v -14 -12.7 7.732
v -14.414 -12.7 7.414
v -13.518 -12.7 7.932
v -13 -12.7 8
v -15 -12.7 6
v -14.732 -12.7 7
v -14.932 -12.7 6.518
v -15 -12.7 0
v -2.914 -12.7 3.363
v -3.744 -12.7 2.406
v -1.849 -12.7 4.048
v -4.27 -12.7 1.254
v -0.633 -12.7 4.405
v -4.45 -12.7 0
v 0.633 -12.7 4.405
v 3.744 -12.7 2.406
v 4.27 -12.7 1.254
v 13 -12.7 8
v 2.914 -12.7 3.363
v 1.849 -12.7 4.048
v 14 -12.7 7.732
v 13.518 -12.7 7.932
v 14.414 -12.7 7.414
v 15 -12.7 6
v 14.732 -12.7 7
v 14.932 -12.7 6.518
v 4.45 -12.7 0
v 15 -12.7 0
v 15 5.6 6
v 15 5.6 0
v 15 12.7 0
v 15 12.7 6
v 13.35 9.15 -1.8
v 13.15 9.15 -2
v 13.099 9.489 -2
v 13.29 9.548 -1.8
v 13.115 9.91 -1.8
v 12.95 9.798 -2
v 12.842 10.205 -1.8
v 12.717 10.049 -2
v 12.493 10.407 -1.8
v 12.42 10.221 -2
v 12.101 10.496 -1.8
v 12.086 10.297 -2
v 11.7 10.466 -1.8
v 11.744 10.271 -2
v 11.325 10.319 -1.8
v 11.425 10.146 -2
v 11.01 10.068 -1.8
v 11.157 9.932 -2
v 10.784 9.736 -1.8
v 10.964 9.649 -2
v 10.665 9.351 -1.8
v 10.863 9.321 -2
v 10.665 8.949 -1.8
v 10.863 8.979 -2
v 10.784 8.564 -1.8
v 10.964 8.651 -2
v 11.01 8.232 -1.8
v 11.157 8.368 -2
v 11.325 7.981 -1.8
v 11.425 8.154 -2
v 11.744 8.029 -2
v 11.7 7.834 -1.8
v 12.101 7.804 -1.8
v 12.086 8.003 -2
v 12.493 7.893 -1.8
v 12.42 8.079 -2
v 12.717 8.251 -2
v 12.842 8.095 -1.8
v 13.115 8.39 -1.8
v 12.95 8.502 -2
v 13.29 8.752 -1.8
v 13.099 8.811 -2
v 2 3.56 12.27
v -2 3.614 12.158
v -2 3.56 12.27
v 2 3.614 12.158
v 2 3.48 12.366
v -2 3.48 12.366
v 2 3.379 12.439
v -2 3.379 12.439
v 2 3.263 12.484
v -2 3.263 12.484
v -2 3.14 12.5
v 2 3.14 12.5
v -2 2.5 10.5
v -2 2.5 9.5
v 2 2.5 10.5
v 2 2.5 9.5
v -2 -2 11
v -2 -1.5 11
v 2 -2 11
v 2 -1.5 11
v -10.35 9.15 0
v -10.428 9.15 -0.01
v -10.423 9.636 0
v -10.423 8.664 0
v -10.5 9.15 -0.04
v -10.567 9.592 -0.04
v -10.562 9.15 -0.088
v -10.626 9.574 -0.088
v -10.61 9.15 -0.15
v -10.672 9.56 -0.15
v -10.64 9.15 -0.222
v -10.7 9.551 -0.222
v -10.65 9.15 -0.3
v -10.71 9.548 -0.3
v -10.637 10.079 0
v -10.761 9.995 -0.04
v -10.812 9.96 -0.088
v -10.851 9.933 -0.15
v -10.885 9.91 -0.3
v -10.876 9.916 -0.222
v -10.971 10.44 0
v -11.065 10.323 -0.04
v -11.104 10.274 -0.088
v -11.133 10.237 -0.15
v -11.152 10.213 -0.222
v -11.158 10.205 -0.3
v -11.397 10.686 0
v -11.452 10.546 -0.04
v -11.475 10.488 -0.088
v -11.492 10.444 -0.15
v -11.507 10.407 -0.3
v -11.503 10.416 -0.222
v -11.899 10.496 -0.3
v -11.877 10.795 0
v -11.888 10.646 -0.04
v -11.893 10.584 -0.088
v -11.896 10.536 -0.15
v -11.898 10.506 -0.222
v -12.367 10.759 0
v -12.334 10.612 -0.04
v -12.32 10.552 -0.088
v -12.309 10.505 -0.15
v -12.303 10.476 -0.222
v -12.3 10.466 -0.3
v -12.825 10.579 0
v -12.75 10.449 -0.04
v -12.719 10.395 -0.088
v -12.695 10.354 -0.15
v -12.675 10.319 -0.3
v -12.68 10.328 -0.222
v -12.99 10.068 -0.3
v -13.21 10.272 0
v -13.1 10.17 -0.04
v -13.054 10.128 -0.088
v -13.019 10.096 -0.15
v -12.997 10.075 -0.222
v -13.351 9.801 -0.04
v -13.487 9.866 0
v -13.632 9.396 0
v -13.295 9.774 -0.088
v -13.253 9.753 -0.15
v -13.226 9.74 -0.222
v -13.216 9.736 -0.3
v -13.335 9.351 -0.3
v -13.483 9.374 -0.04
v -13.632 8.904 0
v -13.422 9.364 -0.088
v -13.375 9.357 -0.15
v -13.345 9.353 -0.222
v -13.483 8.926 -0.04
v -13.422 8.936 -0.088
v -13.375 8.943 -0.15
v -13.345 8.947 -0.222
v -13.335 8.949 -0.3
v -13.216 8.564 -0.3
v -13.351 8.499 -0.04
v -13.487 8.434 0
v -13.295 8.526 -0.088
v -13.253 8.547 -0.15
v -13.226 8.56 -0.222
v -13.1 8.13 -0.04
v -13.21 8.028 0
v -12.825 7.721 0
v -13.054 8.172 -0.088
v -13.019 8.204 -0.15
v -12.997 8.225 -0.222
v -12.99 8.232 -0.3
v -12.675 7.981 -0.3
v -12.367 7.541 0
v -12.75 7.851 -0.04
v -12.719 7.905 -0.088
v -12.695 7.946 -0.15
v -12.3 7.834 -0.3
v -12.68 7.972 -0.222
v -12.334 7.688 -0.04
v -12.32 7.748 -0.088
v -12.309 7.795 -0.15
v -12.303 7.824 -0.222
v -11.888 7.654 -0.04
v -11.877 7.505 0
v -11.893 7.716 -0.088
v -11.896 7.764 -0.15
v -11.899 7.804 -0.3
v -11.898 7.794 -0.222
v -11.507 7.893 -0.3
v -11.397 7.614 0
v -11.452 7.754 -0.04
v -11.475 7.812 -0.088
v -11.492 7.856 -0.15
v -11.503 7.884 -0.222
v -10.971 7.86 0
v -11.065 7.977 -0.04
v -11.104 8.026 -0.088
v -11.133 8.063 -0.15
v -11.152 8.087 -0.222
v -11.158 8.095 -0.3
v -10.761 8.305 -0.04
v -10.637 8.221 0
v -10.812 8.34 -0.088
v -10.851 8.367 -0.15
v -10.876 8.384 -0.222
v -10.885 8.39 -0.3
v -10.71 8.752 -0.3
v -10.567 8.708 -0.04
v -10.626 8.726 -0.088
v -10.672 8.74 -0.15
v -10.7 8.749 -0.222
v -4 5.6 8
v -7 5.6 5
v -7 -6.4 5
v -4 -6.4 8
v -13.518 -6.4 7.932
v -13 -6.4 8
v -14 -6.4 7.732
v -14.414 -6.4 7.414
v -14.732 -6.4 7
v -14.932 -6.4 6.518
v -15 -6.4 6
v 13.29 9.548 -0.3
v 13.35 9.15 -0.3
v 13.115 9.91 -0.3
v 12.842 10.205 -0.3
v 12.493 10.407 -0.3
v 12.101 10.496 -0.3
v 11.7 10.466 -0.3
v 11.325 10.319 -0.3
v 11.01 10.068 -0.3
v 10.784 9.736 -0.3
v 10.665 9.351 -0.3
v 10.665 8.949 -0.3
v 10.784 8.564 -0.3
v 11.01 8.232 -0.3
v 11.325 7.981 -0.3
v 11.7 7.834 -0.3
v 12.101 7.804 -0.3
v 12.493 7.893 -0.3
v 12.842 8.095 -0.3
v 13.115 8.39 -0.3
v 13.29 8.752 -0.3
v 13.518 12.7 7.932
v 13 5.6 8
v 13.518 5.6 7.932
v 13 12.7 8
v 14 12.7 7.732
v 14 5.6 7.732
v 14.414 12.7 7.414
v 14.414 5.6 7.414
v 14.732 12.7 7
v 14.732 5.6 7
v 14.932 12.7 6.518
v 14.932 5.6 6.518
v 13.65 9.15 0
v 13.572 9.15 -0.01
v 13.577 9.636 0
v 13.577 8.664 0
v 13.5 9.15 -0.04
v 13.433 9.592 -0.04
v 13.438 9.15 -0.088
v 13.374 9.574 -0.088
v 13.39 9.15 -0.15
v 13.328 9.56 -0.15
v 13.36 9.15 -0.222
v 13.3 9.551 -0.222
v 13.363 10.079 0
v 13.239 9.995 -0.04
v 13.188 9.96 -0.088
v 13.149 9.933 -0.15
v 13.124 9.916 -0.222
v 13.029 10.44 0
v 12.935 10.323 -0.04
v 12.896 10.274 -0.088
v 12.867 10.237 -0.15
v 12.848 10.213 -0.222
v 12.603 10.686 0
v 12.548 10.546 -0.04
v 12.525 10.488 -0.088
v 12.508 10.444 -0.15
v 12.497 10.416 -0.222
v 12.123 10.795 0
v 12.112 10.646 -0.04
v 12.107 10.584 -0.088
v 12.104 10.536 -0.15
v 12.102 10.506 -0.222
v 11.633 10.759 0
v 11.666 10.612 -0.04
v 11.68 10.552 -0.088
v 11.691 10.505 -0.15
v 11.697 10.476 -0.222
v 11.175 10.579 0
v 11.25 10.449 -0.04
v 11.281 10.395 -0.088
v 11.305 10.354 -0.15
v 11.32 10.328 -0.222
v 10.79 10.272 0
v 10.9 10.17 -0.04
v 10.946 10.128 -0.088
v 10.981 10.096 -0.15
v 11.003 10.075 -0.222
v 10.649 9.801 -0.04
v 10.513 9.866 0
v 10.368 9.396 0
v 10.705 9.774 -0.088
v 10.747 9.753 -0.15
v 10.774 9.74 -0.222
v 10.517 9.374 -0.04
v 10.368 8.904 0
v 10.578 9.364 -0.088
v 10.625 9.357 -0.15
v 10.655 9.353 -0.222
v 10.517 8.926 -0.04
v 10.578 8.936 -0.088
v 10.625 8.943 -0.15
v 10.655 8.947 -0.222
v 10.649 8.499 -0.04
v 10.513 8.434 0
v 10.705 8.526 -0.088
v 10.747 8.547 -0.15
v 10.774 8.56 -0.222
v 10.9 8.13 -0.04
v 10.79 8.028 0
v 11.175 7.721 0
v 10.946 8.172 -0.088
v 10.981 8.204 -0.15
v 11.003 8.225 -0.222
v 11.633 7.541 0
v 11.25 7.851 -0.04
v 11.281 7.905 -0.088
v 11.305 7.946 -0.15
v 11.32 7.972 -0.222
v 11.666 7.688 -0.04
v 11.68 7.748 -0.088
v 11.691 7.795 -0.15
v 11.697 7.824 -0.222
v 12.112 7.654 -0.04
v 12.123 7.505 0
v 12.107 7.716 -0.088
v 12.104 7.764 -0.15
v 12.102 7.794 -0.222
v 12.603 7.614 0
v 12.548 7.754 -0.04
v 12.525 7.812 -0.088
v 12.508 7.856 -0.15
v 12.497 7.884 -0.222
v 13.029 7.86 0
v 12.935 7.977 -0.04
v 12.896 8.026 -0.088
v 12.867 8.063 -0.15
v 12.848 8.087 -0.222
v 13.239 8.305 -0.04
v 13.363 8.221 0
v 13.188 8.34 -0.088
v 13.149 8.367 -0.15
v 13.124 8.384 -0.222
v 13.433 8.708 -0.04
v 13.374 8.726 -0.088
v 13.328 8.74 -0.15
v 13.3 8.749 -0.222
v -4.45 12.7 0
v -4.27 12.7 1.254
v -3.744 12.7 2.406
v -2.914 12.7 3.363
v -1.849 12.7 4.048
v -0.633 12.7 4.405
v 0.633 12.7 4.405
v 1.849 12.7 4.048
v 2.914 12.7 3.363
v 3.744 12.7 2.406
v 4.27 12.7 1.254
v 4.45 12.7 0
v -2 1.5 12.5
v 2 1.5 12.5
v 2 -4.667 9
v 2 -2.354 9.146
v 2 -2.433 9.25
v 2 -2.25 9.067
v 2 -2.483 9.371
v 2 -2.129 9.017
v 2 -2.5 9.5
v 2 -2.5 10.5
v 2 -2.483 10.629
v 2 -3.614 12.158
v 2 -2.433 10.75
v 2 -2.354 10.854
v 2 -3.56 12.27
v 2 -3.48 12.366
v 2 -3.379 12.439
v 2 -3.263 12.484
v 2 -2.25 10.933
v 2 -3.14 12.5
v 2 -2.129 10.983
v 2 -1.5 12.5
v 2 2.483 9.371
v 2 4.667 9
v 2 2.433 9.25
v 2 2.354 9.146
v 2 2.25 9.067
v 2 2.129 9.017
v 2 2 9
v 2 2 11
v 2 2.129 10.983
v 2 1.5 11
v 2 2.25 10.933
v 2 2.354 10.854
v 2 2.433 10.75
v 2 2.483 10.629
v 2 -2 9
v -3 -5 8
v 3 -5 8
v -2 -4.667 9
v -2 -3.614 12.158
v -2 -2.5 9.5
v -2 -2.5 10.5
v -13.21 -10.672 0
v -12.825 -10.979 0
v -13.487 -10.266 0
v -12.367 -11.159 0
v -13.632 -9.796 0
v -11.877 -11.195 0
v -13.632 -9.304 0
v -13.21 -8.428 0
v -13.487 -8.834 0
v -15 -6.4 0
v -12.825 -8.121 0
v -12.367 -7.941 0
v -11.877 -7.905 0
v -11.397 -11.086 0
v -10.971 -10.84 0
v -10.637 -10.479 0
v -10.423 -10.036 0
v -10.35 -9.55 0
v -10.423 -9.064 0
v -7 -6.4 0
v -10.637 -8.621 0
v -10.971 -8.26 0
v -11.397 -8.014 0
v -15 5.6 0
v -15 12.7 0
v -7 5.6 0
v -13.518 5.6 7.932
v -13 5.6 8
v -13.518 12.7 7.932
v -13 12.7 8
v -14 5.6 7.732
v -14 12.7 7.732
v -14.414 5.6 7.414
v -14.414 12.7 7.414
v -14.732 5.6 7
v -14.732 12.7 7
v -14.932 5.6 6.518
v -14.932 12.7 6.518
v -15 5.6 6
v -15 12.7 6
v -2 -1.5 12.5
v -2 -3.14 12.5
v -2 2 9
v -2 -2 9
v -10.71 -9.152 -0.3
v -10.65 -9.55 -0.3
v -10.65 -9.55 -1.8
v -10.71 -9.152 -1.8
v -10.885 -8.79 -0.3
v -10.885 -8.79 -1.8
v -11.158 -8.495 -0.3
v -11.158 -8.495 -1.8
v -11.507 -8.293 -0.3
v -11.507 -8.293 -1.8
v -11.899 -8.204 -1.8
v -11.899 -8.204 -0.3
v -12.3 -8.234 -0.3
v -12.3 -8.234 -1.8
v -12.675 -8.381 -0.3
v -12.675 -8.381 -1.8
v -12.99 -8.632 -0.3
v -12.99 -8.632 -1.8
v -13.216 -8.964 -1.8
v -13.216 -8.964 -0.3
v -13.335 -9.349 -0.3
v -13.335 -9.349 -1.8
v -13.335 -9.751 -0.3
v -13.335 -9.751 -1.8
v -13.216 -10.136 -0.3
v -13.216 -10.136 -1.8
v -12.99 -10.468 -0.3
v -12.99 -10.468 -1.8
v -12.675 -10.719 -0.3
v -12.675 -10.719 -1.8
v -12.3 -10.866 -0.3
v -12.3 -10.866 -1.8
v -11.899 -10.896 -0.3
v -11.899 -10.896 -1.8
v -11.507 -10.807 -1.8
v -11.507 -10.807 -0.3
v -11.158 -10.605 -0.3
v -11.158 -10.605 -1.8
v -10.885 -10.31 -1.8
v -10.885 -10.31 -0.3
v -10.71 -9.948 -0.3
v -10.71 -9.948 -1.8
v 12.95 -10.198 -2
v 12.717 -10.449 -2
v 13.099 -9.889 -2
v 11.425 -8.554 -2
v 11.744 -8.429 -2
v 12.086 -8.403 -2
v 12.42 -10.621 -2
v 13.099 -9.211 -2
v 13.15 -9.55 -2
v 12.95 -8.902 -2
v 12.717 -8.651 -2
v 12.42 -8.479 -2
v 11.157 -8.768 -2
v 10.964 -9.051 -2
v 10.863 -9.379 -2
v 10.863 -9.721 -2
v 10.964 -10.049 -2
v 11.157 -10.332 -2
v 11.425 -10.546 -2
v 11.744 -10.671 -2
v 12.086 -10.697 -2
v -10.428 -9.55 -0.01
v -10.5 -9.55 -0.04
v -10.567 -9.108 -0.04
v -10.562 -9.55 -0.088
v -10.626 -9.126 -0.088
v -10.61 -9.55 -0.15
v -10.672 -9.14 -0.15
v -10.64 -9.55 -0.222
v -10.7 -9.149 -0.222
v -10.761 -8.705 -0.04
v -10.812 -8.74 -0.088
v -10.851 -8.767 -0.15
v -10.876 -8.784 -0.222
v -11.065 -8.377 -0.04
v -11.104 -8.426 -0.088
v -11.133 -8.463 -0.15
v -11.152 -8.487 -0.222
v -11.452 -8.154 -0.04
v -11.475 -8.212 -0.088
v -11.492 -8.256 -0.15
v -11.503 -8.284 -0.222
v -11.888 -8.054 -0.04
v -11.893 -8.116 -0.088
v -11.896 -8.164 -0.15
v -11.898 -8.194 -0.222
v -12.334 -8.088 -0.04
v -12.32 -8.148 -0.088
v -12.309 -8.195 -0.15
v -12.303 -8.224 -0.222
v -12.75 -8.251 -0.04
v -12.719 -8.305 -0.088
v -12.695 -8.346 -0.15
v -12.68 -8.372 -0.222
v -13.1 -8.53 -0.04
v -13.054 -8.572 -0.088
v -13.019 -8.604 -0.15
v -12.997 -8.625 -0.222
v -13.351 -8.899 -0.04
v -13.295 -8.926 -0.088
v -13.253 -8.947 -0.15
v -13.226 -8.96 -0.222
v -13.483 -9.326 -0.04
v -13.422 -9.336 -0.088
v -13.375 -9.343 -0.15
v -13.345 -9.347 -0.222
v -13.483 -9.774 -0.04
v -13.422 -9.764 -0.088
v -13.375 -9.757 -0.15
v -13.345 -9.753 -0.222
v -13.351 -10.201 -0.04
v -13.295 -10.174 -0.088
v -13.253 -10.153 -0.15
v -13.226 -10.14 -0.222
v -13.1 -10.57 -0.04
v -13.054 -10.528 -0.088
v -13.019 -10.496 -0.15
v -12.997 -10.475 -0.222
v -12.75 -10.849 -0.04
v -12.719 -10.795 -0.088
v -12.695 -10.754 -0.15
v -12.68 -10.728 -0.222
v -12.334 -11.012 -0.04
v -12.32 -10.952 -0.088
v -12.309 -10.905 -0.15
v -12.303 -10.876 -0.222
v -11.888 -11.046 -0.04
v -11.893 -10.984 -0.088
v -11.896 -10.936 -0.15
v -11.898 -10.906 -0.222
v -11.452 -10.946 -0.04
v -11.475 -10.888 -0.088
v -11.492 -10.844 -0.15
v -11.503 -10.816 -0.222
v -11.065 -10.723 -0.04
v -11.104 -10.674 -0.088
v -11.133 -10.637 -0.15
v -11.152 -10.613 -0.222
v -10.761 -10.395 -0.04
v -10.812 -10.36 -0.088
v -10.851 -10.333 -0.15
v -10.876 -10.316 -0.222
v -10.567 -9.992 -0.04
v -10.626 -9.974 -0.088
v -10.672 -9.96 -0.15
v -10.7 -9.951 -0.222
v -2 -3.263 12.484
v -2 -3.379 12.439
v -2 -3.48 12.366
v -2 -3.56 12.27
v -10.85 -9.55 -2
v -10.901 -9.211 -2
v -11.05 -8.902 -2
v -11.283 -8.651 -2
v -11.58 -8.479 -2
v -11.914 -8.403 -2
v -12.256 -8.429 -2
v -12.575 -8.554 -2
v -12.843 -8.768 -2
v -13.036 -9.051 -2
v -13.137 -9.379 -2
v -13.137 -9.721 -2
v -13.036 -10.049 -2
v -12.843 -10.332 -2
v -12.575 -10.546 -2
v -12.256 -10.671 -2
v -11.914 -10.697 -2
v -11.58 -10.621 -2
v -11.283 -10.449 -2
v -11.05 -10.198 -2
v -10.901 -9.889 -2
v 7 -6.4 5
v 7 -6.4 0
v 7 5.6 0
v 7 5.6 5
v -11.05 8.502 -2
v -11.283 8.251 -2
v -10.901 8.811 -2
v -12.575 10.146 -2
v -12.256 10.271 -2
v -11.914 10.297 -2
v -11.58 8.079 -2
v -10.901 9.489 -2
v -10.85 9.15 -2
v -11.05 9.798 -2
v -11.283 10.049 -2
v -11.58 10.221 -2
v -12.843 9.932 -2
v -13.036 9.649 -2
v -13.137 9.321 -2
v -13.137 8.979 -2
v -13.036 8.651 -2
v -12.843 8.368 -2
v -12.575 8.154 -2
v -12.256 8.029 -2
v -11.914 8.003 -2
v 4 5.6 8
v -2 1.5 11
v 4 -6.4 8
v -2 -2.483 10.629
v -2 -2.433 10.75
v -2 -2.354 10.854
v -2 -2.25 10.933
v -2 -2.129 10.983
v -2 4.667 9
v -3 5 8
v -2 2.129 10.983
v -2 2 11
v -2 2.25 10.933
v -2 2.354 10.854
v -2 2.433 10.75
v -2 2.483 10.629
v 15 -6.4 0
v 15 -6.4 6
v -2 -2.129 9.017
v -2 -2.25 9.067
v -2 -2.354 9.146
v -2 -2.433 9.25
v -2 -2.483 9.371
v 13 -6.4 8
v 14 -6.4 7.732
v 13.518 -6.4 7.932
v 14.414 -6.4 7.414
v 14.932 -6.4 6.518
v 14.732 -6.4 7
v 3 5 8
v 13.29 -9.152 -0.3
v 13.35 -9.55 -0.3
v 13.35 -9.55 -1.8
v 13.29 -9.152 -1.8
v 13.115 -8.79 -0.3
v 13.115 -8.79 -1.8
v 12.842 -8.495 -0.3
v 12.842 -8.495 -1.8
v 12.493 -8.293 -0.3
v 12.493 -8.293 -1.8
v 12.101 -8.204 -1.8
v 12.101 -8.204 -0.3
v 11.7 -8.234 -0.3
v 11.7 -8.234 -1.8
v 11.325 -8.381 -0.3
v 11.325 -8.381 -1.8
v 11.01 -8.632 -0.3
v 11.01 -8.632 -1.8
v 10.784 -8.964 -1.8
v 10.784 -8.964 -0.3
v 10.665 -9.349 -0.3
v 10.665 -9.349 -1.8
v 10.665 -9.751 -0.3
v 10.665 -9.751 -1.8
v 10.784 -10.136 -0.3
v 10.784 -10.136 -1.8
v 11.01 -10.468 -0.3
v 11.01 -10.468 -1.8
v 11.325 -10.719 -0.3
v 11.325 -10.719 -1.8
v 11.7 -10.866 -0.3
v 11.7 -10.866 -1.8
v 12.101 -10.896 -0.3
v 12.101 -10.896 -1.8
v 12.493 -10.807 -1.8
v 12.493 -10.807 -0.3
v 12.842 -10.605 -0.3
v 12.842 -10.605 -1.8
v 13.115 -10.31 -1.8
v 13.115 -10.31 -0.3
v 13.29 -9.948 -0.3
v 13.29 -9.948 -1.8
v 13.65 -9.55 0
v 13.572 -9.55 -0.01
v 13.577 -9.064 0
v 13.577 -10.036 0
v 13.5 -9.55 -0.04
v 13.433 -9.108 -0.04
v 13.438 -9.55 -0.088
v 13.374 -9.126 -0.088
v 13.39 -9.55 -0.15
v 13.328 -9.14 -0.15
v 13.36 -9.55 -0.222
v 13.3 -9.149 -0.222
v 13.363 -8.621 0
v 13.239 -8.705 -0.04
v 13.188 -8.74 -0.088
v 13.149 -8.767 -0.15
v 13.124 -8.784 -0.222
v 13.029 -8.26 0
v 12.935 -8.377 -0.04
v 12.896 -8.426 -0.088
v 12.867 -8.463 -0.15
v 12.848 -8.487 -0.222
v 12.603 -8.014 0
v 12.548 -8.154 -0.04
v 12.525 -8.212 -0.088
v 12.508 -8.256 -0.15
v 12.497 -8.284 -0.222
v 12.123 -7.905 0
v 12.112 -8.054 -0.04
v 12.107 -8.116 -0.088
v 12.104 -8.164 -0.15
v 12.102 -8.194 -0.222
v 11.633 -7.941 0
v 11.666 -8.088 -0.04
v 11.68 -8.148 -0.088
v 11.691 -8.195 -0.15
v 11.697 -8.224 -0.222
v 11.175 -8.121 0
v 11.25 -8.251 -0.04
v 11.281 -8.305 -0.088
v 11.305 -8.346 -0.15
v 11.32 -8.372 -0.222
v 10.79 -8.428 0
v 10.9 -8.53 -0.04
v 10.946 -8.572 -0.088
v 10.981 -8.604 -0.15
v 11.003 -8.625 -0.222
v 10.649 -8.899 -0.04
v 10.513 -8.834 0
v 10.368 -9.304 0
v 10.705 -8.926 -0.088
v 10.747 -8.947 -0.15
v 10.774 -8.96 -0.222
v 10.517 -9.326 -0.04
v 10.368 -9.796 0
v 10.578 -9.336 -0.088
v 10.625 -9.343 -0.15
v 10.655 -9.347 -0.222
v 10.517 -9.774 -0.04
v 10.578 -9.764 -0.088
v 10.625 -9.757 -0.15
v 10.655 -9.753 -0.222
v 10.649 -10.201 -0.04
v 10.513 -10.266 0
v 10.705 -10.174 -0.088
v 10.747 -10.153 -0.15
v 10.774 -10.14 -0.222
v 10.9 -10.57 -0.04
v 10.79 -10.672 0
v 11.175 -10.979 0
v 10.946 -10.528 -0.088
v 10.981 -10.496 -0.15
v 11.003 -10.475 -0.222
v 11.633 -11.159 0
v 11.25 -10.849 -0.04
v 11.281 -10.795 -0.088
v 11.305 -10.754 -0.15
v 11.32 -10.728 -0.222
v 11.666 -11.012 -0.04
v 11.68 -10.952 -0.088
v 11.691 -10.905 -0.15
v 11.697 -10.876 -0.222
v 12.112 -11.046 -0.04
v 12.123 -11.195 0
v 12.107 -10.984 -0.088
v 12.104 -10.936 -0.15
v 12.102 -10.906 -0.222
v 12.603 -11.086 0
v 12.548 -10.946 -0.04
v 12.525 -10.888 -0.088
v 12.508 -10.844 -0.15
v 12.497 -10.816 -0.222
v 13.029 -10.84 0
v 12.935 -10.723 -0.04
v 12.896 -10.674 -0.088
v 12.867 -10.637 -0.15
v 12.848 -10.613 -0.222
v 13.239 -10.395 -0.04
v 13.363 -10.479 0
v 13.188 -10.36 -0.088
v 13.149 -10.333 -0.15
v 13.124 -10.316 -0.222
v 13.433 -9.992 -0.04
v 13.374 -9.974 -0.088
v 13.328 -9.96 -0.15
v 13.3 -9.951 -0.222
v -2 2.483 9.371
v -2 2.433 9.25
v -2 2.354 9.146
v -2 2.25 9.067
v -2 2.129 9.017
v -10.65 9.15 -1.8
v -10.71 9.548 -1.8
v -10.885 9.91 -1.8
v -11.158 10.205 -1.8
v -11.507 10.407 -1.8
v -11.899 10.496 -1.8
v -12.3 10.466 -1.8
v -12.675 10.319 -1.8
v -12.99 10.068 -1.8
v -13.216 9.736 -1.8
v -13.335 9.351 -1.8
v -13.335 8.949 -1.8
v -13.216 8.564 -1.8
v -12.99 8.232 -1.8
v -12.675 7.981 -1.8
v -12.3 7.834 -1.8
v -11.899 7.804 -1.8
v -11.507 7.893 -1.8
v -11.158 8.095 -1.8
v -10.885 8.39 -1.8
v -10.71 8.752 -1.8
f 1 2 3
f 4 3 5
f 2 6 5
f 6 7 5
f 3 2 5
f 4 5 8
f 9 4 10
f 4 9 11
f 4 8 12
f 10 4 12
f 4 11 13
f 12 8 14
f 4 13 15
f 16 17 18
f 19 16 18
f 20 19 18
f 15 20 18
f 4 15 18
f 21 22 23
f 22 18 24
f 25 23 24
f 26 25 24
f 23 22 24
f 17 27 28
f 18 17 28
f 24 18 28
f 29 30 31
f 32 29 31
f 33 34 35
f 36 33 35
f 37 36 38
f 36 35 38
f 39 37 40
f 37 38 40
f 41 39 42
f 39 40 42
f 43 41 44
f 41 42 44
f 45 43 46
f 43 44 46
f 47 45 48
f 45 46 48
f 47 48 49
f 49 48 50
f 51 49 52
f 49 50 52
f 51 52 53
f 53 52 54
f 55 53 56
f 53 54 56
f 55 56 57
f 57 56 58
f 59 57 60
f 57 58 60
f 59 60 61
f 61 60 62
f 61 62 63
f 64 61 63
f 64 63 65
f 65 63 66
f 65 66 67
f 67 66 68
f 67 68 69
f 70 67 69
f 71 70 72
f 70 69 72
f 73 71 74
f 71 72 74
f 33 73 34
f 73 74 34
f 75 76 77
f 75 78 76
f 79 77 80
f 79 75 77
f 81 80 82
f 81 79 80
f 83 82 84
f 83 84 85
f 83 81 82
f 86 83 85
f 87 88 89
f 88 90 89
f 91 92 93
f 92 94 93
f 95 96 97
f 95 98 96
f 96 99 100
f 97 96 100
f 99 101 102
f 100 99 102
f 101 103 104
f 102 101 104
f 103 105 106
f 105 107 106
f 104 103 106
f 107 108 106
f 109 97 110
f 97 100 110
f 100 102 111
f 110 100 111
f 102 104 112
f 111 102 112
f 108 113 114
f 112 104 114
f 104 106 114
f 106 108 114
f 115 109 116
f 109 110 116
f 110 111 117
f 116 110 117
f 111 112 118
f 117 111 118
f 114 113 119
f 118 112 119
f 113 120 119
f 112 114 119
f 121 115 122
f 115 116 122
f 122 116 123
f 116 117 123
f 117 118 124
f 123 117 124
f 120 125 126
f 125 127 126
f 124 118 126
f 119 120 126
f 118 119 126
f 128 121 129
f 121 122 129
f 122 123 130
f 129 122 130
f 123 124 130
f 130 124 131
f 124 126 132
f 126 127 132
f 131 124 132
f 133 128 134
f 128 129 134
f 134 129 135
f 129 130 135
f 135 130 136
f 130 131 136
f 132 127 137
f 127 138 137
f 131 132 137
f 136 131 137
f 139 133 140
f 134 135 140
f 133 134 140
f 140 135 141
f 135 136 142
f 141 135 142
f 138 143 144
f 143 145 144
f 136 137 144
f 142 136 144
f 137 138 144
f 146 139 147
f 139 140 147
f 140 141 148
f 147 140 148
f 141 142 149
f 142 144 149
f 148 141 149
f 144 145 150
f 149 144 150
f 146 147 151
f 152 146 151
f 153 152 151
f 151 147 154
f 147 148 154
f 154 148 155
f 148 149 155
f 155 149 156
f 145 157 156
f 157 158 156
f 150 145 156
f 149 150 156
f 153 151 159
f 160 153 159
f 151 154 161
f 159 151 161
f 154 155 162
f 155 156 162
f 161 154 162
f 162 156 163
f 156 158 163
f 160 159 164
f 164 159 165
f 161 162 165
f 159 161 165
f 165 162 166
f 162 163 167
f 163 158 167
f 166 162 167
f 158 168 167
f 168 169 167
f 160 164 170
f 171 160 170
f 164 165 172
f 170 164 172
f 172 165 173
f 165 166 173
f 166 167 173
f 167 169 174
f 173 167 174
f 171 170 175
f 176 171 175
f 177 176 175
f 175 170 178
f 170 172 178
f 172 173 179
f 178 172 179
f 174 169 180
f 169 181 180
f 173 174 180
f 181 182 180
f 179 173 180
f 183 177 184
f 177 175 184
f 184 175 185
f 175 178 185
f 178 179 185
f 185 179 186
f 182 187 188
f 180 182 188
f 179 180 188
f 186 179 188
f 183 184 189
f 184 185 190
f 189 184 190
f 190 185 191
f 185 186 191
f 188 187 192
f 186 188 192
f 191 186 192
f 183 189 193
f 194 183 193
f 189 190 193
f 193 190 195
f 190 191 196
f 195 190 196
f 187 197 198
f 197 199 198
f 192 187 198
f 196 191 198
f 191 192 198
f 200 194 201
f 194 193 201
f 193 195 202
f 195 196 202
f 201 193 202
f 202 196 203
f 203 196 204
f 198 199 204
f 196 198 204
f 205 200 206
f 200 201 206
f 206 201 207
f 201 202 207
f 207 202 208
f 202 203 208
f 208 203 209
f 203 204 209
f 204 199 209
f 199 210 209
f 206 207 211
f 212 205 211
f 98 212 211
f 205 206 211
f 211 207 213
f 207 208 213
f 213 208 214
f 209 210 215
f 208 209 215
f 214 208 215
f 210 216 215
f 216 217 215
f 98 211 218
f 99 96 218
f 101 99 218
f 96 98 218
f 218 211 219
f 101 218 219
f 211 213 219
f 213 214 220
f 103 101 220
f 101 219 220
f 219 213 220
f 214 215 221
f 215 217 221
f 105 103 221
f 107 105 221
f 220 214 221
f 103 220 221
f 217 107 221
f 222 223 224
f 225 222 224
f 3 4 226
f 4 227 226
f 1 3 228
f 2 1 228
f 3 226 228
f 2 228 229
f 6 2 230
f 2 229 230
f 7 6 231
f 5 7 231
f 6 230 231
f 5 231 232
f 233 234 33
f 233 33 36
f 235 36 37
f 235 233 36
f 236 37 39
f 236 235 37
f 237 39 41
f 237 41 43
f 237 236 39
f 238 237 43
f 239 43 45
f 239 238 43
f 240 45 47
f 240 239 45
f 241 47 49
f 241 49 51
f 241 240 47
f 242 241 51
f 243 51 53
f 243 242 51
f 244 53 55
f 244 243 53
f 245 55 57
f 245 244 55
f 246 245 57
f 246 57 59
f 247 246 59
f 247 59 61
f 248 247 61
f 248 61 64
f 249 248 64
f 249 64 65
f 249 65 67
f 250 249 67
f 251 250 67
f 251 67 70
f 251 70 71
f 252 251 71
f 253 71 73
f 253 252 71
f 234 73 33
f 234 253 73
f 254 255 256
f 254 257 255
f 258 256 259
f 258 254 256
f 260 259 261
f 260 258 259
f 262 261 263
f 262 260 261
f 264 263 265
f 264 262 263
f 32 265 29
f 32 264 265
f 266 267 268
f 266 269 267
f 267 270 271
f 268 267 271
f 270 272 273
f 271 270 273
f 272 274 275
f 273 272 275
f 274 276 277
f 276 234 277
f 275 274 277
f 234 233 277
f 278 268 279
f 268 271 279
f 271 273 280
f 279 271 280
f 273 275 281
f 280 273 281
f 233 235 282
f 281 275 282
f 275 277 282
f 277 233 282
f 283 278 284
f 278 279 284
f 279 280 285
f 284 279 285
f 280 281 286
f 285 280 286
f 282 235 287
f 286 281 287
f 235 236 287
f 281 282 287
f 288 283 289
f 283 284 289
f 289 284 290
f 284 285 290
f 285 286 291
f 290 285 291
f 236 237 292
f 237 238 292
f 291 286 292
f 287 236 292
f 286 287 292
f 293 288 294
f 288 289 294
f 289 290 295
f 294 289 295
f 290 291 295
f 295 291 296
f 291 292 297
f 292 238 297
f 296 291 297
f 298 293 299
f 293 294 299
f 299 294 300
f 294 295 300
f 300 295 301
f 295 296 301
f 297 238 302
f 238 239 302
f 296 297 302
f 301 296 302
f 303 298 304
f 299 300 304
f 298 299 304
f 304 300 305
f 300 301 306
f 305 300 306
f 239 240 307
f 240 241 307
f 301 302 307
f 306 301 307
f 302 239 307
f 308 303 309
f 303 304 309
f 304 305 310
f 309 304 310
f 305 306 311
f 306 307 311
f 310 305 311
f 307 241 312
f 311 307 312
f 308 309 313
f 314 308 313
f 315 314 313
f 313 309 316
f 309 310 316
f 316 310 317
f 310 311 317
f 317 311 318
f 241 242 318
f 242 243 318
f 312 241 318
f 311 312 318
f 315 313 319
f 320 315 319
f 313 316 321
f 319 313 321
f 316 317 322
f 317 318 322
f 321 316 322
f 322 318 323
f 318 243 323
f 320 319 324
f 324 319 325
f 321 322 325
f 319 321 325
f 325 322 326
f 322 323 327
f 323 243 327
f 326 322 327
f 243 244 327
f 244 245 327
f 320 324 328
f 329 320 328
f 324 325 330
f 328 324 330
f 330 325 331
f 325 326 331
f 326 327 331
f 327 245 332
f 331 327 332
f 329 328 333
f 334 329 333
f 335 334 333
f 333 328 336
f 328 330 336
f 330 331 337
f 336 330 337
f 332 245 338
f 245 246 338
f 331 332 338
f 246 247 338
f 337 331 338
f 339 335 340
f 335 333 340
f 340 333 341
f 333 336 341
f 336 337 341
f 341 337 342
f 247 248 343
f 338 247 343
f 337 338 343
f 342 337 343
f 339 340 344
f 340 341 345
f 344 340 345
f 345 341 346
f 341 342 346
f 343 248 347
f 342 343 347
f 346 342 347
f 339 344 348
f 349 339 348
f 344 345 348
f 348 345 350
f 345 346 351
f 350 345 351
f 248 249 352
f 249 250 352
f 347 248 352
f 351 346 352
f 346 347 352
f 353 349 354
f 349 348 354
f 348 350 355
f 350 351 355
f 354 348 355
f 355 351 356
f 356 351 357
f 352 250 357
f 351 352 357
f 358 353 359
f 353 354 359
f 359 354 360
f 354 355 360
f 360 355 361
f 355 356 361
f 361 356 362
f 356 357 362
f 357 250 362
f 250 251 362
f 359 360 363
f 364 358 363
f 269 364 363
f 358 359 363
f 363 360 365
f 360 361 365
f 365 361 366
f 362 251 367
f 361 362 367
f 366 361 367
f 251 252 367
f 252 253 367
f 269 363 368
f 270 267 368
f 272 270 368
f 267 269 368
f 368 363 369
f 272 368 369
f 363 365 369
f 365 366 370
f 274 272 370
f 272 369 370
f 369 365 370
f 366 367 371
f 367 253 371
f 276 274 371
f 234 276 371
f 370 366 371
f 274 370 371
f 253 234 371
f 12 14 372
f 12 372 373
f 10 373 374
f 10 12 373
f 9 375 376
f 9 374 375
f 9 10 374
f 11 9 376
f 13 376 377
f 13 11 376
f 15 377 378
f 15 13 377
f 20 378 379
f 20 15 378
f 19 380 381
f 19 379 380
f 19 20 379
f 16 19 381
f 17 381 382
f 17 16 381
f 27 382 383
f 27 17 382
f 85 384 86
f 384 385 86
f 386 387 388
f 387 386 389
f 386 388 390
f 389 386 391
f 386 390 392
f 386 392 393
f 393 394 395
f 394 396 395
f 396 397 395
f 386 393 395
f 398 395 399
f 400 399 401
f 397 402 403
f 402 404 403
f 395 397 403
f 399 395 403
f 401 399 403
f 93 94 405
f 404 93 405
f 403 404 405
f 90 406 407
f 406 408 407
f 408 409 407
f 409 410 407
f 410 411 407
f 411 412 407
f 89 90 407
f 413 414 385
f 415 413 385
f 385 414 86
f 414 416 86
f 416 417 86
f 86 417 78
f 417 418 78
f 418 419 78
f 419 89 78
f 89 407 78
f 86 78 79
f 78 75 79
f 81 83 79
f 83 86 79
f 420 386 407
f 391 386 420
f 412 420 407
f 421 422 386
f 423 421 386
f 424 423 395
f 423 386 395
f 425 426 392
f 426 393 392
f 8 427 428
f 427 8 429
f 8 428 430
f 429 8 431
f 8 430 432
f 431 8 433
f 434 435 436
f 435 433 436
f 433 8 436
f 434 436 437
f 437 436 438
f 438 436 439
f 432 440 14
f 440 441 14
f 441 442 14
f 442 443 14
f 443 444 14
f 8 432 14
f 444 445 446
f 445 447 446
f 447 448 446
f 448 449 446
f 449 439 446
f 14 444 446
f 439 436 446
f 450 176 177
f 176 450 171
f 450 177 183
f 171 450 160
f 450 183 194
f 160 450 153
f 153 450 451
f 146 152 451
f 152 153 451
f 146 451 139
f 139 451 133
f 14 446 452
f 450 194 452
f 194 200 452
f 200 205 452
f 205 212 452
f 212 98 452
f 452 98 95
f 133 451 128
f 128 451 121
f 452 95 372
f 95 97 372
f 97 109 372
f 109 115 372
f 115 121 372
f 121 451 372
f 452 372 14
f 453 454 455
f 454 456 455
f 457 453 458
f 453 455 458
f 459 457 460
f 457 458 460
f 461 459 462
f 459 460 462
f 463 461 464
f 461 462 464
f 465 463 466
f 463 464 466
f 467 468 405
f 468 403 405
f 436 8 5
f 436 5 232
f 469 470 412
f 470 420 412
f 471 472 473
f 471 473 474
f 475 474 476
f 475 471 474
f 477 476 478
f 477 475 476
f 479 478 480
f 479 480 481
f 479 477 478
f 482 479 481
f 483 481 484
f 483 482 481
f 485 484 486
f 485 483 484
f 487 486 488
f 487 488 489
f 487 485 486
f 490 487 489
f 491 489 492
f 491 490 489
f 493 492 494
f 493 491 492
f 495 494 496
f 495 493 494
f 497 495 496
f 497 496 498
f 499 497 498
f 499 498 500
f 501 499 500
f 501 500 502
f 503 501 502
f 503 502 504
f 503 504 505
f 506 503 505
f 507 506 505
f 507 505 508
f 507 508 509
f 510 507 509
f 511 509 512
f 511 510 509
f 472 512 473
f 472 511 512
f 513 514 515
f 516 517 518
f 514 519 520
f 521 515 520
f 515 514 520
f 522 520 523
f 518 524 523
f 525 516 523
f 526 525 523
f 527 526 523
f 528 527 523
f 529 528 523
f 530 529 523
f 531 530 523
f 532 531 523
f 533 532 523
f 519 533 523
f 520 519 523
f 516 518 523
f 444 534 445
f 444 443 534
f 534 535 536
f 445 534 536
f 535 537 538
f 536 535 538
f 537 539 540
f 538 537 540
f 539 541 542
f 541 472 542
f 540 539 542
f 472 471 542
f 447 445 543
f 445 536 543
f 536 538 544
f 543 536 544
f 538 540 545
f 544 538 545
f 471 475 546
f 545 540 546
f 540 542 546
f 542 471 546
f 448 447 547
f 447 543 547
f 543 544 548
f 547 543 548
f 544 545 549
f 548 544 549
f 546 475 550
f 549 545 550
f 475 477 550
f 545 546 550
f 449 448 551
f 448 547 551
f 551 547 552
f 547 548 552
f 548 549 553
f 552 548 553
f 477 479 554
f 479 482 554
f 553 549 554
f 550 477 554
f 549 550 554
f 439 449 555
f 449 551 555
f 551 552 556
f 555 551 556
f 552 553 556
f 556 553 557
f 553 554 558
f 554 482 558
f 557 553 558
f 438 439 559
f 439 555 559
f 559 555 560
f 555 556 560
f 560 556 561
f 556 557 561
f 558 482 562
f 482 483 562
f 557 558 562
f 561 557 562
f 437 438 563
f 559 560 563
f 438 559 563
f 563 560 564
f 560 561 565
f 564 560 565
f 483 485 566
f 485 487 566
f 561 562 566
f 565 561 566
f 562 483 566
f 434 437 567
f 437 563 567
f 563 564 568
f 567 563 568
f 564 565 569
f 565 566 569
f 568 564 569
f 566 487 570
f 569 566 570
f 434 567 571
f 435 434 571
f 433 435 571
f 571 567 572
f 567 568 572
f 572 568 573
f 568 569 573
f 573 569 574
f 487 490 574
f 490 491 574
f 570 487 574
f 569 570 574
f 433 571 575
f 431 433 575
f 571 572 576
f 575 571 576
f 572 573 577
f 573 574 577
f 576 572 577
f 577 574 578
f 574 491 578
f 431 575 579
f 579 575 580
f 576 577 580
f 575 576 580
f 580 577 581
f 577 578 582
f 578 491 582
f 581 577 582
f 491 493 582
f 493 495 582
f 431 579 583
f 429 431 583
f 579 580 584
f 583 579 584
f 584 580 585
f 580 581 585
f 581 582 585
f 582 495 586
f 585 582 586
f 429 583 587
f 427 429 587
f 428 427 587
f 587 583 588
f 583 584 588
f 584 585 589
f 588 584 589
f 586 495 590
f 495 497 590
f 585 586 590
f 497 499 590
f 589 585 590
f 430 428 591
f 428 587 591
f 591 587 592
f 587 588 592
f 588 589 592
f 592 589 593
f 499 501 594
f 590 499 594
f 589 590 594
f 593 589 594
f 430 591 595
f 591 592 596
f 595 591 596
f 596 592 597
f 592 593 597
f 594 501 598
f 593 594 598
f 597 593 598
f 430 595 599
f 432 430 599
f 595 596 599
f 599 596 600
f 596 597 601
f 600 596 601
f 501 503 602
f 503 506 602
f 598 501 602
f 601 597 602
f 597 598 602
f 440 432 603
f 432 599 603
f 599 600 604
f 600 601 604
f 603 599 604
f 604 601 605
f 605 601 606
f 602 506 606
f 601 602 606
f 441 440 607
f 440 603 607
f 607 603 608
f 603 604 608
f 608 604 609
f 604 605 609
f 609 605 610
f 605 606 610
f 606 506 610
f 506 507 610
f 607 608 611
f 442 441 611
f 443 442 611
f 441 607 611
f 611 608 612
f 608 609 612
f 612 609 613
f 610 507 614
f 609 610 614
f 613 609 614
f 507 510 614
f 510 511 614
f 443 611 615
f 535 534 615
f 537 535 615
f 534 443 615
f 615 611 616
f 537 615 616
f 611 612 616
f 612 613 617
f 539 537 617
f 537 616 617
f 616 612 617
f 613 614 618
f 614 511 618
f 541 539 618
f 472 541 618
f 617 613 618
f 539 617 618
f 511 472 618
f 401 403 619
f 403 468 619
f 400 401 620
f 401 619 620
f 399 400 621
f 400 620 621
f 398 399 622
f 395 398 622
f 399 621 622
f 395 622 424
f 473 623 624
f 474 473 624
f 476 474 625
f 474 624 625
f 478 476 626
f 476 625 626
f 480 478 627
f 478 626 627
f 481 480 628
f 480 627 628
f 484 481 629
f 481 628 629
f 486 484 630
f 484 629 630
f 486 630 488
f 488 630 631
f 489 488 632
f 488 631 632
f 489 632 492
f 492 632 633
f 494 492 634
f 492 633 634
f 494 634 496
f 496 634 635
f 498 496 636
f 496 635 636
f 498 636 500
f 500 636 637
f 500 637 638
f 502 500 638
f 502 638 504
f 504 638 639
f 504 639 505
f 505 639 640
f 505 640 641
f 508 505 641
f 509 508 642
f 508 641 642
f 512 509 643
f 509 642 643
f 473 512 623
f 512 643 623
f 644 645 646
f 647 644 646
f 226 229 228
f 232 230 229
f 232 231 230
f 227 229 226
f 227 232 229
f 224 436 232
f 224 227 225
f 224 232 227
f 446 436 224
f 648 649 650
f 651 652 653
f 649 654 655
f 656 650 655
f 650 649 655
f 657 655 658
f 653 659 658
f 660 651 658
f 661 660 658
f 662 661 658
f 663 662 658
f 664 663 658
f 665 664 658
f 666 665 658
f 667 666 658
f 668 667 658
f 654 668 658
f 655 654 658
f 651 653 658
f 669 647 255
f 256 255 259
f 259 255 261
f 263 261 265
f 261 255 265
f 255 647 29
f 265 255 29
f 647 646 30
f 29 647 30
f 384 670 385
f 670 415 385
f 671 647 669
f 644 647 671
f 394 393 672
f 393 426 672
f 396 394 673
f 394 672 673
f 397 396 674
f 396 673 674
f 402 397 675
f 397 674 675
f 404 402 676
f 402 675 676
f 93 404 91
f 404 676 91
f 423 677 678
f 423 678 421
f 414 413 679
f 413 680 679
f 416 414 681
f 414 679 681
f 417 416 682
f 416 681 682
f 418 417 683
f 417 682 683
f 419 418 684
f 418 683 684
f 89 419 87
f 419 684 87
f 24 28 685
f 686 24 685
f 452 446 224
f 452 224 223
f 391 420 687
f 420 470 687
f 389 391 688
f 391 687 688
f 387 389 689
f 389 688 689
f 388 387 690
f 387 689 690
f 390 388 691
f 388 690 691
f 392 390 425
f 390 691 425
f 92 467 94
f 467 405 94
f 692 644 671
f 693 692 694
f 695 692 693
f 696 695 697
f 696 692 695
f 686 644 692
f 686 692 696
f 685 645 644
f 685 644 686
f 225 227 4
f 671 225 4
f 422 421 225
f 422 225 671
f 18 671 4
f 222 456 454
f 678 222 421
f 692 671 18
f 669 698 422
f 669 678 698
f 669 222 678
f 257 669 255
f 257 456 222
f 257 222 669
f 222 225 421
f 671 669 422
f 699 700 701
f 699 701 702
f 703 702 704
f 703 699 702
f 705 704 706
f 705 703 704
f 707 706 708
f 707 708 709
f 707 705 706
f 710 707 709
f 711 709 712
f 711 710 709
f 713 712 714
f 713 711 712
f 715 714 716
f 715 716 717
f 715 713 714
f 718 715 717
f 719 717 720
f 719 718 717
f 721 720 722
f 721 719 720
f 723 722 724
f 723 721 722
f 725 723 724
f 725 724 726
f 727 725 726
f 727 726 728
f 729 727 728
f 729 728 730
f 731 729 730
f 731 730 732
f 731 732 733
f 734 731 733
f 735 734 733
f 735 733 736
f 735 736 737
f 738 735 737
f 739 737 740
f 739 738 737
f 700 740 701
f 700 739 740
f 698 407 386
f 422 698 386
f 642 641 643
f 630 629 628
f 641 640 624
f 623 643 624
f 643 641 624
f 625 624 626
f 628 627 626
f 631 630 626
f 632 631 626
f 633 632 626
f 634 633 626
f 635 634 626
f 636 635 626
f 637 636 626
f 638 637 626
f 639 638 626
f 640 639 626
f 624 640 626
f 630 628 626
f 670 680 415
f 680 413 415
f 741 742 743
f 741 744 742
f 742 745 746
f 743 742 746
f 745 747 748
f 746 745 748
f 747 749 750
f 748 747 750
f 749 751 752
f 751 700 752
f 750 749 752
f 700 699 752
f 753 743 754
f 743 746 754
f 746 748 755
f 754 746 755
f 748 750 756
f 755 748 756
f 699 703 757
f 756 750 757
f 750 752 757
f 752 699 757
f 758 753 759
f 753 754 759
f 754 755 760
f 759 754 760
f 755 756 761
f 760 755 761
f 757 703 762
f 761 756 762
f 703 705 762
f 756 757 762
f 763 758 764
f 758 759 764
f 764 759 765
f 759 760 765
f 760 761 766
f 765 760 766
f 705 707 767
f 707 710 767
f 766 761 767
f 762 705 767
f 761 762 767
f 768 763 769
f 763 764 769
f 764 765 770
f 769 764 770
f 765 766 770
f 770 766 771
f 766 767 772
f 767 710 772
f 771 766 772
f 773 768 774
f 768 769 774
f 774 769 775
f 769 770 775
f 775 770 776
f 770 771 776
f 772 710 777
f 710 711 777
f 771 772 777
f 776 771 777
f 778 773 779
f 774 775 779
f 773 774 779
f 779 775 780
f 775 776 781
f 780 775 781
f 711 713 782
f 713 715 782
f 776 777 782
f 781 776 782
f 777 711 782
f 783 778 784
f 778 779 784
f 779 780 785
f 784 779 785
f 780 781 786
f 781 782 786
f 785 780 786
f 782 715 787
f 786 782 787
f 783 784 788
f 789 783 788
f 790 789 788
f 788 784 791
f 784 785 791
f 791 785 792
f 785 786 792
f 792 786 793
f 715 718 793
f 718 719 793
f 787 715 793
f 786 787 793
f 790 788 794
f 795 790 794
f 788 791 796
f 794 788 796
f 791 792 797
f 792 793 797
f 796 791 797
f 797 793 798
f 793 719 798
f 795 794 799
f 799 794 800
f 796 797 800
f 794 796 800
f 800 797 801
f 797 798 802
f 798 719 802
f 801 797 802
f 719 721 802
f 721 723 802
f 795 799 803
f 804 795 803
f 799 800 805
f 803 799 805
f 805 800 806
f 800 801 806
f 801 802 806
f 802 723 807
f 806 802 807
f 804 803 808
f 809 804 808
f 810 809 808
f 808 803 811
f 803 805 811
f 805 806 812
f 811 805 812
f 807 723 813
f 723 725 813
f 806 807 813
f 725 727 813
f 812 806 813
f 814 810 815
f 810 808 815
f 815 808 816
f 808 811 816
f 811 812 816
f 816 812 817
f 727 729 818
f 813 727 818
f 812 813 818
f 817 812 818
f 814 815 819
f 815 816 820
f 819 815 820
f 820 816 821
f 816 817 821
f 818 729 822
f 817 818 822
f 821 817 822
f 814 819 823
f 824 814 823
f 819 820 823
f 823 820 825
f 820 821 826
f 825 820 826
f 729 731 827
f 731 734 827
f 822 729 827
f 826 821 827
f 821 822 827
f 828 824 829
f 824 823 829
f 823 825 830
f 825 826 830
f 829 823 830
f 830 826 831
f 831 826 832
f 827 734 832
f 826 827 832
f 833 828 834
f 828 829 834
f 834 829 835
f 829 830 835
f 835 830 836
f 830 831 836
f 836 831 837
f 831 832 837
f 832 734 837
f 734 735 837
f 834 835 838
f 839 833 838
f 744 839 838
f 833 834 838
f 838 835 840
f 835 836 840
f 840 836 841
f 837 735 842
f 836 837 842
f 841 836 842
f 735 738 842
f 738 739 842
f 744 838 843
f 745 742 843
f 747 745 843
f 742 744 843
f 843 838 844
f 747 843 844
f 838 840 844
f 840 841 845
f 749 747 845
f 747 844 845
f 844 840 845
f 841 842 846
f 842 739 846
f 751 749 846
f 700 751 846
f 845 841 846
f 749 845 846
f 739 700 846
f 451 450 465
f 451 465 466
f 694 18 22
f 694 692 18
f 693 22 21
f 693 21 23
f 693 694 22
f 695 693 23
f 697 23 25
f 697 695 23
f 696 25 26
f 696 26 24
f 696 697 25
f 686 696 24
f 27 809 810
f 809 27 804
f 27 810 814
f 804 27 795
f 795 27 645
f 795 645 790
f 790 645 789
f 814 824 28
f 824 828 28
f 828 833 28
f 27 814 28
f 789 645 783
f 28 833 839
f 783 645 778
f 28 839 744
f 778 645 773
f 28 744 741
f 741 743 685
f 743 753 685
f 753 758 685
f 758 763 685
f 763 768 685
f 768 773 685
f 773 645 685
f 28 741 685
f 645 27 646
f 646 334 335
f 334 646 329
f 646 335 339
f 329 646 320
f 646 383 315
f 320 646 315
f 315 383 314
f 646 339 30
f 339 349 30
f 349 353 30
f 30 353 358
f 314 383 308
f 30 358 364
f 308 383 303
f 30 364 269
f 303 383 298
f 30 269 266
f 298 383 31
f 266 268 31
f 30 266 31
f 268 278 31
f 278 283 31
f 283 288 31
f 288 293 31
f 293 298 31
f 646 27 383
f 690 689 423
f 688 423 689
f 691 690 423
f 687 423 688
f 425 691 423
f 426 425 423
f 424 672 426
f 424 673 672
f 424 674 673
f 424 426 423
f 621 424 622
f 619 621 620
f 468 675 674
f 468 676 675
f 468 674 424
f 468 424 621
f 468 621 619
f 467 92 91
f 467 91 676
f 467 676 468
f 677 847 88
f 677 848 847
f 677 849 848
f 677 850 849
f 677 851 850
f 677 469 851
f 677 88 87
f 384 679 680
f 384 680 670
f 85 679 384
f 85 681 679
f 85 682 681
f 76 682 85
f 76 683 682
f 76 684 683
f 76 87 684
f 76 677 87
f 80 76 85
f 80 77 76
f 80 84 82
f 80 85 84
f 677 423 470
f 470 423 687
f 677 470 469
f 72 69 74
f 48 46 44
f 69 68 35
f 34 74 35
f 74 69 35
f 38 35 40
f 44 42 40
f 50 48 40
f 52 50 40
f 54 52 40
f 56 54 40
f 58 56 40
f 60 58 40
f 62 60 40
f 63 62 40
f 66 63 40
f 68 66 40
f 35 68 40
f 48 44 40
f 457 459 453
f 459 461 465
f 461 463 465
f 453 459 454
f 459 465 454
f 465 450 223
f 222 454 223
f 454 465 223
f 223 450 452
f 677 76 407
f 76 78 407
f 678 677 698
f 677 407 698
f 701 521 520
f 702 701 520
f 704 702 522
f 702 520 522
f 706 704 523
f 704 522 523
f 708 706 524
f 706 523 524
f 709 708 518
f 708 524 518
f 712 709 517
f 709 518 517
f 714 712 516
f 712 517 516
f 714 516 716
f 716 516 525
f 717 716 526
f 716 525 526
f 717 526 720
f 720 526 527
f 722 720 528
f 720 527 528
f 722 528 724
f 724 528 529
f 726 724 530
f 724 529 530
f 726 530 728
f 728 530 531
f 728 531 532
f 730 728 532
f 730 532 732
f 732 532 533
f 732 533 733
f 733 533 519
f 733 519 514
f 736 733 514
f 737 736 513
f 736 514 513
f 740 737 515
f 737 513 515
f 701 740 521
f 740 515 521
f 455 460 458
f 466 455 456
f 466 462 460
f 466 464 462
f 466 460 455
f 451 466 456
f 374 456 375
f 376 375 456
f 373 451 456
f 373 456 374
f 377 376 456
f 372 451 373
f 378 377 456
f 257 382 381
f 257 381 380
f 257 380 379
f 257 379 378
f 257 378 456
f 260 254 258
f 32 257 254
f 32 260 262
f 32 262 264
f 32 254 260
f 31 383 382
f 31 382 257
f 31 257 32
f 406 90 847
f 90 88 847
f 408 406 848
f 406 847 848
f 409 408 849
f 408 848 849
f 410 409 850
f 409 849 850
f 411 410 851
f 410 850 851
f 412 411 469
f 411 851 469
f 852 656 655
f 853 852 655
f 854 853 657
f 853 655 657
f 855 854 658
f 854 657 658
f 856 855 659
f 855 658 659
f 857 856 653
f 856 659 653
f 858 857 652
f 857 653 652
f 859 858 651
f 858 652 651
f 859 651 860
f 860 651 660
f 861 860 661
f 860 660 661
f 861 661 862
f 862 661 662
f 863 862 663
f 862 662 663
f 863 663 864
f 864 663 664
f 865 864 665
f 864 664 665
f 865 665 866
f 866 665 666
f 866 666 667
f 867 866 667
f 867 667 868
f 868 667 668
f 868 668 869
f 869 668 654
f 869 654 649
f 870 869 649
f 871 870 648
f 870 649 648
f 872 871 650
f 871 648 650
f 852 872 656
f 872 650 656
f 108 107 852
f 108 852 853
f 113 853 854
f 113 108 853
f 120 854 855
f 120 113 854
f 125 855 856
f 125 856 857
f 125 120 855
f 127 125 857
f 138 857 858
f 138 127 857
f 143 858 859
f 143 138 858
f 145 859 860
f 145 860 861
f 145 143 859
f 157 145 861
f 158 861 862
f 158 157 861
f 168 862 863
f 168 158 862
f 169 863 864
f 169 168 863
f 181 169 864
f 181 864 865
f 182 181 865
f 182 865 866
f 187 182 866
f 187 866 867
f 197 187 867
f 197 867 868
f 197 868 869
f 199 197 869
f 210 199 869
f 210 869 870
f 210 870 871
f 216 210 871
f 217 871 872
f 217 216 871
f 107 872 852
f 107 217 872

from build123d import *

# Parameters (mm, degrees)
SKETCH1_W               = 30
SKETCH1_H               = 25.4
BOSS_EXTRUDE1_DEPTH     = 8
CUT_EXTRUDE1_DEPTH      = 22.2200377
CUT_EXTRUDE1_DEPTH_BACK = 22.2200377
SKETCH2_R               = 4.45
SKETCH3_R               = 1.35
BOSS_EXTRUDE2_DEPTH     = 2
FILLET1_R               = 0.3
CHAMFER1_SIZE           = 0.2
SKETCH4_W               = 8
SKETCH4_H               = 12
CUT_EXTRUDE2_DEPTH      = 22.2200377
BOSS_EXTRUDE3_DEPTH     = 2
CHAMFER2_SIZE           = 1
FILLET2_R               = 0.5
CHAMFER3_SIZE           = 3
FILLET3_R               = 2


with BuildPart() as part:
    # Sketch1 → Boss-Extrude1 (new body)
    with BuildSketch(Plane.XY):
        Rectangle(SKETCH1_W, SKETCH1_H)
    extrude(amount=BOSS_EXTRUDE1_DEPTH)

    # Sketch2 → Cut-Extrude1 (cut, two sides: drawn at the far end of the back side and taken through both)
    with BuildSketch(Plane(origin=(0, 0, 0), x_dir=(1, 0, 0), z_dir=(0, 1, 0)).offset(-CUT_EXTRUDE1_DEPTH_BACK)):
        Circle(SKETCH2_R)
    extrude(amount=CUT_EXTRUDE1_DEPTH + CUT_EXTRUDE1_DEPTH_BACK, mode=Mode.SUBTRACT)

    # Sketch3 → Boss-Extrude2 (add)
    with BuildSketch(Plane.XY):
        with Locations((-12, 9.15)):
            Circle(SKETCH3_R)
        with Locations((12, 9.15)):
            Circle(SKETCH3_R)
        with Locations((12, -9.55)):
            Circle(SKETCH3_R)
        with Locations((-12, -9.55)):
            Circle(SKETCH3_R)
    extrude(amount=-BOSS_EXTRUDE2_DEPTH)

    # Fillet1
    fillet1_edges = [part.edges().sort_by_distance(p)[0] for p in [
        (-13.35, 9.15, 0),
        (10.65, 9.15, 0),
        (10.65, -9.55, 0),
        (-13.35, -9.55, 0),
    ]]
    fillet(fillet1_edges, radius=FILLET1_R)

    # Chamfer1
    chamfer1_edges = [part.edges().sort_by_distance(p)[0] for p in [
        (-13.35, 9.15, -2),
        (10.65, 9.15, -2),
        (10.65, -9.55, -2),
        (-13.35, -9.55, -2),
    ]]
    chamfer(chamfer1_edges, length=CHAMFER1_SIZE)

    # Sketch4 → Cut-Extrude2 (cut, through all)
    with BuildSketch(Plane.XY):
        with Locations((-11, -0.4)):
            Rectangle(SKETCH4_W, SKETCH4_H)
        with Locations((11, -0.4)):
            Rectangle(SKETCH4_W, SKETCH4_H)
    extrude(amount=CUT_EXTRUDE2_DEPTH, mode=Mode.SUBTRACT)

    # Sketch5 → Boss-Extrude3 (add, symmetric)
    with BuildSketch(Plane(origin=(0, 0, 0), x_dir=(0, 0, -1), z_dir=(1, 0, 0))):
        Polygon((-8, 5), (-8, -5), (-12.5, -3.5), (-12.5, -1.5), (-11, -1.5), (-11, -2.5), (-9, -2.5), (-9, 2.5), (-11, 2.5), (-11, 1.5), (-12.5, 1.5), (-12.5, 3.5), align=None)
    extrude(amount=BOSS_EXTRUDE3_DEPTH, both=True)

    # Chamfer2
    chamfer2_edges = [part.edges().sort_by_distance(p)[0] for p in [
        (2, 0, 8),
        (-2, 0, 8),
    ]]
    chamfer(chamfer2_edges, length=CHAMFER2_SIZE - 0.0001)  # a hair under: the kernel refuses the full size

    # Fillet2
    fillet2_edges = [part.edges().sort_by_distance(p)[0] for p in [
        (0, 3.5, 12.5),
        (0, 2.5, 11),
        (0, 2.5, 9),
        (0, -2.5, 9),
        (0, -2.5, 11),
        (0, -3.5, 12.5),
    ]]
    fillet(fillet2_edges, radius=FILLET2_R)

    # Chamfer3
    chamfer3_edges = [part.edges().sort_by_distance(p)[0] for p in [
        (-7, -0.4, 8),
        (7, -0.4, 8),
    ]]
    chamfer(chamfer3_edges, length=CHAMFER3_SIZE)

    # Fillet3
    fillet3_edges = [part.edges().sort_by_distance(p)[0] for p in [
        (-15, 9.15, 8),
        (15, -9.55, 8),
        (15, 9.15, 8),
        (-15, -9.55, 8),
    ]]
    fillet(fillet3_edges, radius=FILLET3_R)


solid = part.part
